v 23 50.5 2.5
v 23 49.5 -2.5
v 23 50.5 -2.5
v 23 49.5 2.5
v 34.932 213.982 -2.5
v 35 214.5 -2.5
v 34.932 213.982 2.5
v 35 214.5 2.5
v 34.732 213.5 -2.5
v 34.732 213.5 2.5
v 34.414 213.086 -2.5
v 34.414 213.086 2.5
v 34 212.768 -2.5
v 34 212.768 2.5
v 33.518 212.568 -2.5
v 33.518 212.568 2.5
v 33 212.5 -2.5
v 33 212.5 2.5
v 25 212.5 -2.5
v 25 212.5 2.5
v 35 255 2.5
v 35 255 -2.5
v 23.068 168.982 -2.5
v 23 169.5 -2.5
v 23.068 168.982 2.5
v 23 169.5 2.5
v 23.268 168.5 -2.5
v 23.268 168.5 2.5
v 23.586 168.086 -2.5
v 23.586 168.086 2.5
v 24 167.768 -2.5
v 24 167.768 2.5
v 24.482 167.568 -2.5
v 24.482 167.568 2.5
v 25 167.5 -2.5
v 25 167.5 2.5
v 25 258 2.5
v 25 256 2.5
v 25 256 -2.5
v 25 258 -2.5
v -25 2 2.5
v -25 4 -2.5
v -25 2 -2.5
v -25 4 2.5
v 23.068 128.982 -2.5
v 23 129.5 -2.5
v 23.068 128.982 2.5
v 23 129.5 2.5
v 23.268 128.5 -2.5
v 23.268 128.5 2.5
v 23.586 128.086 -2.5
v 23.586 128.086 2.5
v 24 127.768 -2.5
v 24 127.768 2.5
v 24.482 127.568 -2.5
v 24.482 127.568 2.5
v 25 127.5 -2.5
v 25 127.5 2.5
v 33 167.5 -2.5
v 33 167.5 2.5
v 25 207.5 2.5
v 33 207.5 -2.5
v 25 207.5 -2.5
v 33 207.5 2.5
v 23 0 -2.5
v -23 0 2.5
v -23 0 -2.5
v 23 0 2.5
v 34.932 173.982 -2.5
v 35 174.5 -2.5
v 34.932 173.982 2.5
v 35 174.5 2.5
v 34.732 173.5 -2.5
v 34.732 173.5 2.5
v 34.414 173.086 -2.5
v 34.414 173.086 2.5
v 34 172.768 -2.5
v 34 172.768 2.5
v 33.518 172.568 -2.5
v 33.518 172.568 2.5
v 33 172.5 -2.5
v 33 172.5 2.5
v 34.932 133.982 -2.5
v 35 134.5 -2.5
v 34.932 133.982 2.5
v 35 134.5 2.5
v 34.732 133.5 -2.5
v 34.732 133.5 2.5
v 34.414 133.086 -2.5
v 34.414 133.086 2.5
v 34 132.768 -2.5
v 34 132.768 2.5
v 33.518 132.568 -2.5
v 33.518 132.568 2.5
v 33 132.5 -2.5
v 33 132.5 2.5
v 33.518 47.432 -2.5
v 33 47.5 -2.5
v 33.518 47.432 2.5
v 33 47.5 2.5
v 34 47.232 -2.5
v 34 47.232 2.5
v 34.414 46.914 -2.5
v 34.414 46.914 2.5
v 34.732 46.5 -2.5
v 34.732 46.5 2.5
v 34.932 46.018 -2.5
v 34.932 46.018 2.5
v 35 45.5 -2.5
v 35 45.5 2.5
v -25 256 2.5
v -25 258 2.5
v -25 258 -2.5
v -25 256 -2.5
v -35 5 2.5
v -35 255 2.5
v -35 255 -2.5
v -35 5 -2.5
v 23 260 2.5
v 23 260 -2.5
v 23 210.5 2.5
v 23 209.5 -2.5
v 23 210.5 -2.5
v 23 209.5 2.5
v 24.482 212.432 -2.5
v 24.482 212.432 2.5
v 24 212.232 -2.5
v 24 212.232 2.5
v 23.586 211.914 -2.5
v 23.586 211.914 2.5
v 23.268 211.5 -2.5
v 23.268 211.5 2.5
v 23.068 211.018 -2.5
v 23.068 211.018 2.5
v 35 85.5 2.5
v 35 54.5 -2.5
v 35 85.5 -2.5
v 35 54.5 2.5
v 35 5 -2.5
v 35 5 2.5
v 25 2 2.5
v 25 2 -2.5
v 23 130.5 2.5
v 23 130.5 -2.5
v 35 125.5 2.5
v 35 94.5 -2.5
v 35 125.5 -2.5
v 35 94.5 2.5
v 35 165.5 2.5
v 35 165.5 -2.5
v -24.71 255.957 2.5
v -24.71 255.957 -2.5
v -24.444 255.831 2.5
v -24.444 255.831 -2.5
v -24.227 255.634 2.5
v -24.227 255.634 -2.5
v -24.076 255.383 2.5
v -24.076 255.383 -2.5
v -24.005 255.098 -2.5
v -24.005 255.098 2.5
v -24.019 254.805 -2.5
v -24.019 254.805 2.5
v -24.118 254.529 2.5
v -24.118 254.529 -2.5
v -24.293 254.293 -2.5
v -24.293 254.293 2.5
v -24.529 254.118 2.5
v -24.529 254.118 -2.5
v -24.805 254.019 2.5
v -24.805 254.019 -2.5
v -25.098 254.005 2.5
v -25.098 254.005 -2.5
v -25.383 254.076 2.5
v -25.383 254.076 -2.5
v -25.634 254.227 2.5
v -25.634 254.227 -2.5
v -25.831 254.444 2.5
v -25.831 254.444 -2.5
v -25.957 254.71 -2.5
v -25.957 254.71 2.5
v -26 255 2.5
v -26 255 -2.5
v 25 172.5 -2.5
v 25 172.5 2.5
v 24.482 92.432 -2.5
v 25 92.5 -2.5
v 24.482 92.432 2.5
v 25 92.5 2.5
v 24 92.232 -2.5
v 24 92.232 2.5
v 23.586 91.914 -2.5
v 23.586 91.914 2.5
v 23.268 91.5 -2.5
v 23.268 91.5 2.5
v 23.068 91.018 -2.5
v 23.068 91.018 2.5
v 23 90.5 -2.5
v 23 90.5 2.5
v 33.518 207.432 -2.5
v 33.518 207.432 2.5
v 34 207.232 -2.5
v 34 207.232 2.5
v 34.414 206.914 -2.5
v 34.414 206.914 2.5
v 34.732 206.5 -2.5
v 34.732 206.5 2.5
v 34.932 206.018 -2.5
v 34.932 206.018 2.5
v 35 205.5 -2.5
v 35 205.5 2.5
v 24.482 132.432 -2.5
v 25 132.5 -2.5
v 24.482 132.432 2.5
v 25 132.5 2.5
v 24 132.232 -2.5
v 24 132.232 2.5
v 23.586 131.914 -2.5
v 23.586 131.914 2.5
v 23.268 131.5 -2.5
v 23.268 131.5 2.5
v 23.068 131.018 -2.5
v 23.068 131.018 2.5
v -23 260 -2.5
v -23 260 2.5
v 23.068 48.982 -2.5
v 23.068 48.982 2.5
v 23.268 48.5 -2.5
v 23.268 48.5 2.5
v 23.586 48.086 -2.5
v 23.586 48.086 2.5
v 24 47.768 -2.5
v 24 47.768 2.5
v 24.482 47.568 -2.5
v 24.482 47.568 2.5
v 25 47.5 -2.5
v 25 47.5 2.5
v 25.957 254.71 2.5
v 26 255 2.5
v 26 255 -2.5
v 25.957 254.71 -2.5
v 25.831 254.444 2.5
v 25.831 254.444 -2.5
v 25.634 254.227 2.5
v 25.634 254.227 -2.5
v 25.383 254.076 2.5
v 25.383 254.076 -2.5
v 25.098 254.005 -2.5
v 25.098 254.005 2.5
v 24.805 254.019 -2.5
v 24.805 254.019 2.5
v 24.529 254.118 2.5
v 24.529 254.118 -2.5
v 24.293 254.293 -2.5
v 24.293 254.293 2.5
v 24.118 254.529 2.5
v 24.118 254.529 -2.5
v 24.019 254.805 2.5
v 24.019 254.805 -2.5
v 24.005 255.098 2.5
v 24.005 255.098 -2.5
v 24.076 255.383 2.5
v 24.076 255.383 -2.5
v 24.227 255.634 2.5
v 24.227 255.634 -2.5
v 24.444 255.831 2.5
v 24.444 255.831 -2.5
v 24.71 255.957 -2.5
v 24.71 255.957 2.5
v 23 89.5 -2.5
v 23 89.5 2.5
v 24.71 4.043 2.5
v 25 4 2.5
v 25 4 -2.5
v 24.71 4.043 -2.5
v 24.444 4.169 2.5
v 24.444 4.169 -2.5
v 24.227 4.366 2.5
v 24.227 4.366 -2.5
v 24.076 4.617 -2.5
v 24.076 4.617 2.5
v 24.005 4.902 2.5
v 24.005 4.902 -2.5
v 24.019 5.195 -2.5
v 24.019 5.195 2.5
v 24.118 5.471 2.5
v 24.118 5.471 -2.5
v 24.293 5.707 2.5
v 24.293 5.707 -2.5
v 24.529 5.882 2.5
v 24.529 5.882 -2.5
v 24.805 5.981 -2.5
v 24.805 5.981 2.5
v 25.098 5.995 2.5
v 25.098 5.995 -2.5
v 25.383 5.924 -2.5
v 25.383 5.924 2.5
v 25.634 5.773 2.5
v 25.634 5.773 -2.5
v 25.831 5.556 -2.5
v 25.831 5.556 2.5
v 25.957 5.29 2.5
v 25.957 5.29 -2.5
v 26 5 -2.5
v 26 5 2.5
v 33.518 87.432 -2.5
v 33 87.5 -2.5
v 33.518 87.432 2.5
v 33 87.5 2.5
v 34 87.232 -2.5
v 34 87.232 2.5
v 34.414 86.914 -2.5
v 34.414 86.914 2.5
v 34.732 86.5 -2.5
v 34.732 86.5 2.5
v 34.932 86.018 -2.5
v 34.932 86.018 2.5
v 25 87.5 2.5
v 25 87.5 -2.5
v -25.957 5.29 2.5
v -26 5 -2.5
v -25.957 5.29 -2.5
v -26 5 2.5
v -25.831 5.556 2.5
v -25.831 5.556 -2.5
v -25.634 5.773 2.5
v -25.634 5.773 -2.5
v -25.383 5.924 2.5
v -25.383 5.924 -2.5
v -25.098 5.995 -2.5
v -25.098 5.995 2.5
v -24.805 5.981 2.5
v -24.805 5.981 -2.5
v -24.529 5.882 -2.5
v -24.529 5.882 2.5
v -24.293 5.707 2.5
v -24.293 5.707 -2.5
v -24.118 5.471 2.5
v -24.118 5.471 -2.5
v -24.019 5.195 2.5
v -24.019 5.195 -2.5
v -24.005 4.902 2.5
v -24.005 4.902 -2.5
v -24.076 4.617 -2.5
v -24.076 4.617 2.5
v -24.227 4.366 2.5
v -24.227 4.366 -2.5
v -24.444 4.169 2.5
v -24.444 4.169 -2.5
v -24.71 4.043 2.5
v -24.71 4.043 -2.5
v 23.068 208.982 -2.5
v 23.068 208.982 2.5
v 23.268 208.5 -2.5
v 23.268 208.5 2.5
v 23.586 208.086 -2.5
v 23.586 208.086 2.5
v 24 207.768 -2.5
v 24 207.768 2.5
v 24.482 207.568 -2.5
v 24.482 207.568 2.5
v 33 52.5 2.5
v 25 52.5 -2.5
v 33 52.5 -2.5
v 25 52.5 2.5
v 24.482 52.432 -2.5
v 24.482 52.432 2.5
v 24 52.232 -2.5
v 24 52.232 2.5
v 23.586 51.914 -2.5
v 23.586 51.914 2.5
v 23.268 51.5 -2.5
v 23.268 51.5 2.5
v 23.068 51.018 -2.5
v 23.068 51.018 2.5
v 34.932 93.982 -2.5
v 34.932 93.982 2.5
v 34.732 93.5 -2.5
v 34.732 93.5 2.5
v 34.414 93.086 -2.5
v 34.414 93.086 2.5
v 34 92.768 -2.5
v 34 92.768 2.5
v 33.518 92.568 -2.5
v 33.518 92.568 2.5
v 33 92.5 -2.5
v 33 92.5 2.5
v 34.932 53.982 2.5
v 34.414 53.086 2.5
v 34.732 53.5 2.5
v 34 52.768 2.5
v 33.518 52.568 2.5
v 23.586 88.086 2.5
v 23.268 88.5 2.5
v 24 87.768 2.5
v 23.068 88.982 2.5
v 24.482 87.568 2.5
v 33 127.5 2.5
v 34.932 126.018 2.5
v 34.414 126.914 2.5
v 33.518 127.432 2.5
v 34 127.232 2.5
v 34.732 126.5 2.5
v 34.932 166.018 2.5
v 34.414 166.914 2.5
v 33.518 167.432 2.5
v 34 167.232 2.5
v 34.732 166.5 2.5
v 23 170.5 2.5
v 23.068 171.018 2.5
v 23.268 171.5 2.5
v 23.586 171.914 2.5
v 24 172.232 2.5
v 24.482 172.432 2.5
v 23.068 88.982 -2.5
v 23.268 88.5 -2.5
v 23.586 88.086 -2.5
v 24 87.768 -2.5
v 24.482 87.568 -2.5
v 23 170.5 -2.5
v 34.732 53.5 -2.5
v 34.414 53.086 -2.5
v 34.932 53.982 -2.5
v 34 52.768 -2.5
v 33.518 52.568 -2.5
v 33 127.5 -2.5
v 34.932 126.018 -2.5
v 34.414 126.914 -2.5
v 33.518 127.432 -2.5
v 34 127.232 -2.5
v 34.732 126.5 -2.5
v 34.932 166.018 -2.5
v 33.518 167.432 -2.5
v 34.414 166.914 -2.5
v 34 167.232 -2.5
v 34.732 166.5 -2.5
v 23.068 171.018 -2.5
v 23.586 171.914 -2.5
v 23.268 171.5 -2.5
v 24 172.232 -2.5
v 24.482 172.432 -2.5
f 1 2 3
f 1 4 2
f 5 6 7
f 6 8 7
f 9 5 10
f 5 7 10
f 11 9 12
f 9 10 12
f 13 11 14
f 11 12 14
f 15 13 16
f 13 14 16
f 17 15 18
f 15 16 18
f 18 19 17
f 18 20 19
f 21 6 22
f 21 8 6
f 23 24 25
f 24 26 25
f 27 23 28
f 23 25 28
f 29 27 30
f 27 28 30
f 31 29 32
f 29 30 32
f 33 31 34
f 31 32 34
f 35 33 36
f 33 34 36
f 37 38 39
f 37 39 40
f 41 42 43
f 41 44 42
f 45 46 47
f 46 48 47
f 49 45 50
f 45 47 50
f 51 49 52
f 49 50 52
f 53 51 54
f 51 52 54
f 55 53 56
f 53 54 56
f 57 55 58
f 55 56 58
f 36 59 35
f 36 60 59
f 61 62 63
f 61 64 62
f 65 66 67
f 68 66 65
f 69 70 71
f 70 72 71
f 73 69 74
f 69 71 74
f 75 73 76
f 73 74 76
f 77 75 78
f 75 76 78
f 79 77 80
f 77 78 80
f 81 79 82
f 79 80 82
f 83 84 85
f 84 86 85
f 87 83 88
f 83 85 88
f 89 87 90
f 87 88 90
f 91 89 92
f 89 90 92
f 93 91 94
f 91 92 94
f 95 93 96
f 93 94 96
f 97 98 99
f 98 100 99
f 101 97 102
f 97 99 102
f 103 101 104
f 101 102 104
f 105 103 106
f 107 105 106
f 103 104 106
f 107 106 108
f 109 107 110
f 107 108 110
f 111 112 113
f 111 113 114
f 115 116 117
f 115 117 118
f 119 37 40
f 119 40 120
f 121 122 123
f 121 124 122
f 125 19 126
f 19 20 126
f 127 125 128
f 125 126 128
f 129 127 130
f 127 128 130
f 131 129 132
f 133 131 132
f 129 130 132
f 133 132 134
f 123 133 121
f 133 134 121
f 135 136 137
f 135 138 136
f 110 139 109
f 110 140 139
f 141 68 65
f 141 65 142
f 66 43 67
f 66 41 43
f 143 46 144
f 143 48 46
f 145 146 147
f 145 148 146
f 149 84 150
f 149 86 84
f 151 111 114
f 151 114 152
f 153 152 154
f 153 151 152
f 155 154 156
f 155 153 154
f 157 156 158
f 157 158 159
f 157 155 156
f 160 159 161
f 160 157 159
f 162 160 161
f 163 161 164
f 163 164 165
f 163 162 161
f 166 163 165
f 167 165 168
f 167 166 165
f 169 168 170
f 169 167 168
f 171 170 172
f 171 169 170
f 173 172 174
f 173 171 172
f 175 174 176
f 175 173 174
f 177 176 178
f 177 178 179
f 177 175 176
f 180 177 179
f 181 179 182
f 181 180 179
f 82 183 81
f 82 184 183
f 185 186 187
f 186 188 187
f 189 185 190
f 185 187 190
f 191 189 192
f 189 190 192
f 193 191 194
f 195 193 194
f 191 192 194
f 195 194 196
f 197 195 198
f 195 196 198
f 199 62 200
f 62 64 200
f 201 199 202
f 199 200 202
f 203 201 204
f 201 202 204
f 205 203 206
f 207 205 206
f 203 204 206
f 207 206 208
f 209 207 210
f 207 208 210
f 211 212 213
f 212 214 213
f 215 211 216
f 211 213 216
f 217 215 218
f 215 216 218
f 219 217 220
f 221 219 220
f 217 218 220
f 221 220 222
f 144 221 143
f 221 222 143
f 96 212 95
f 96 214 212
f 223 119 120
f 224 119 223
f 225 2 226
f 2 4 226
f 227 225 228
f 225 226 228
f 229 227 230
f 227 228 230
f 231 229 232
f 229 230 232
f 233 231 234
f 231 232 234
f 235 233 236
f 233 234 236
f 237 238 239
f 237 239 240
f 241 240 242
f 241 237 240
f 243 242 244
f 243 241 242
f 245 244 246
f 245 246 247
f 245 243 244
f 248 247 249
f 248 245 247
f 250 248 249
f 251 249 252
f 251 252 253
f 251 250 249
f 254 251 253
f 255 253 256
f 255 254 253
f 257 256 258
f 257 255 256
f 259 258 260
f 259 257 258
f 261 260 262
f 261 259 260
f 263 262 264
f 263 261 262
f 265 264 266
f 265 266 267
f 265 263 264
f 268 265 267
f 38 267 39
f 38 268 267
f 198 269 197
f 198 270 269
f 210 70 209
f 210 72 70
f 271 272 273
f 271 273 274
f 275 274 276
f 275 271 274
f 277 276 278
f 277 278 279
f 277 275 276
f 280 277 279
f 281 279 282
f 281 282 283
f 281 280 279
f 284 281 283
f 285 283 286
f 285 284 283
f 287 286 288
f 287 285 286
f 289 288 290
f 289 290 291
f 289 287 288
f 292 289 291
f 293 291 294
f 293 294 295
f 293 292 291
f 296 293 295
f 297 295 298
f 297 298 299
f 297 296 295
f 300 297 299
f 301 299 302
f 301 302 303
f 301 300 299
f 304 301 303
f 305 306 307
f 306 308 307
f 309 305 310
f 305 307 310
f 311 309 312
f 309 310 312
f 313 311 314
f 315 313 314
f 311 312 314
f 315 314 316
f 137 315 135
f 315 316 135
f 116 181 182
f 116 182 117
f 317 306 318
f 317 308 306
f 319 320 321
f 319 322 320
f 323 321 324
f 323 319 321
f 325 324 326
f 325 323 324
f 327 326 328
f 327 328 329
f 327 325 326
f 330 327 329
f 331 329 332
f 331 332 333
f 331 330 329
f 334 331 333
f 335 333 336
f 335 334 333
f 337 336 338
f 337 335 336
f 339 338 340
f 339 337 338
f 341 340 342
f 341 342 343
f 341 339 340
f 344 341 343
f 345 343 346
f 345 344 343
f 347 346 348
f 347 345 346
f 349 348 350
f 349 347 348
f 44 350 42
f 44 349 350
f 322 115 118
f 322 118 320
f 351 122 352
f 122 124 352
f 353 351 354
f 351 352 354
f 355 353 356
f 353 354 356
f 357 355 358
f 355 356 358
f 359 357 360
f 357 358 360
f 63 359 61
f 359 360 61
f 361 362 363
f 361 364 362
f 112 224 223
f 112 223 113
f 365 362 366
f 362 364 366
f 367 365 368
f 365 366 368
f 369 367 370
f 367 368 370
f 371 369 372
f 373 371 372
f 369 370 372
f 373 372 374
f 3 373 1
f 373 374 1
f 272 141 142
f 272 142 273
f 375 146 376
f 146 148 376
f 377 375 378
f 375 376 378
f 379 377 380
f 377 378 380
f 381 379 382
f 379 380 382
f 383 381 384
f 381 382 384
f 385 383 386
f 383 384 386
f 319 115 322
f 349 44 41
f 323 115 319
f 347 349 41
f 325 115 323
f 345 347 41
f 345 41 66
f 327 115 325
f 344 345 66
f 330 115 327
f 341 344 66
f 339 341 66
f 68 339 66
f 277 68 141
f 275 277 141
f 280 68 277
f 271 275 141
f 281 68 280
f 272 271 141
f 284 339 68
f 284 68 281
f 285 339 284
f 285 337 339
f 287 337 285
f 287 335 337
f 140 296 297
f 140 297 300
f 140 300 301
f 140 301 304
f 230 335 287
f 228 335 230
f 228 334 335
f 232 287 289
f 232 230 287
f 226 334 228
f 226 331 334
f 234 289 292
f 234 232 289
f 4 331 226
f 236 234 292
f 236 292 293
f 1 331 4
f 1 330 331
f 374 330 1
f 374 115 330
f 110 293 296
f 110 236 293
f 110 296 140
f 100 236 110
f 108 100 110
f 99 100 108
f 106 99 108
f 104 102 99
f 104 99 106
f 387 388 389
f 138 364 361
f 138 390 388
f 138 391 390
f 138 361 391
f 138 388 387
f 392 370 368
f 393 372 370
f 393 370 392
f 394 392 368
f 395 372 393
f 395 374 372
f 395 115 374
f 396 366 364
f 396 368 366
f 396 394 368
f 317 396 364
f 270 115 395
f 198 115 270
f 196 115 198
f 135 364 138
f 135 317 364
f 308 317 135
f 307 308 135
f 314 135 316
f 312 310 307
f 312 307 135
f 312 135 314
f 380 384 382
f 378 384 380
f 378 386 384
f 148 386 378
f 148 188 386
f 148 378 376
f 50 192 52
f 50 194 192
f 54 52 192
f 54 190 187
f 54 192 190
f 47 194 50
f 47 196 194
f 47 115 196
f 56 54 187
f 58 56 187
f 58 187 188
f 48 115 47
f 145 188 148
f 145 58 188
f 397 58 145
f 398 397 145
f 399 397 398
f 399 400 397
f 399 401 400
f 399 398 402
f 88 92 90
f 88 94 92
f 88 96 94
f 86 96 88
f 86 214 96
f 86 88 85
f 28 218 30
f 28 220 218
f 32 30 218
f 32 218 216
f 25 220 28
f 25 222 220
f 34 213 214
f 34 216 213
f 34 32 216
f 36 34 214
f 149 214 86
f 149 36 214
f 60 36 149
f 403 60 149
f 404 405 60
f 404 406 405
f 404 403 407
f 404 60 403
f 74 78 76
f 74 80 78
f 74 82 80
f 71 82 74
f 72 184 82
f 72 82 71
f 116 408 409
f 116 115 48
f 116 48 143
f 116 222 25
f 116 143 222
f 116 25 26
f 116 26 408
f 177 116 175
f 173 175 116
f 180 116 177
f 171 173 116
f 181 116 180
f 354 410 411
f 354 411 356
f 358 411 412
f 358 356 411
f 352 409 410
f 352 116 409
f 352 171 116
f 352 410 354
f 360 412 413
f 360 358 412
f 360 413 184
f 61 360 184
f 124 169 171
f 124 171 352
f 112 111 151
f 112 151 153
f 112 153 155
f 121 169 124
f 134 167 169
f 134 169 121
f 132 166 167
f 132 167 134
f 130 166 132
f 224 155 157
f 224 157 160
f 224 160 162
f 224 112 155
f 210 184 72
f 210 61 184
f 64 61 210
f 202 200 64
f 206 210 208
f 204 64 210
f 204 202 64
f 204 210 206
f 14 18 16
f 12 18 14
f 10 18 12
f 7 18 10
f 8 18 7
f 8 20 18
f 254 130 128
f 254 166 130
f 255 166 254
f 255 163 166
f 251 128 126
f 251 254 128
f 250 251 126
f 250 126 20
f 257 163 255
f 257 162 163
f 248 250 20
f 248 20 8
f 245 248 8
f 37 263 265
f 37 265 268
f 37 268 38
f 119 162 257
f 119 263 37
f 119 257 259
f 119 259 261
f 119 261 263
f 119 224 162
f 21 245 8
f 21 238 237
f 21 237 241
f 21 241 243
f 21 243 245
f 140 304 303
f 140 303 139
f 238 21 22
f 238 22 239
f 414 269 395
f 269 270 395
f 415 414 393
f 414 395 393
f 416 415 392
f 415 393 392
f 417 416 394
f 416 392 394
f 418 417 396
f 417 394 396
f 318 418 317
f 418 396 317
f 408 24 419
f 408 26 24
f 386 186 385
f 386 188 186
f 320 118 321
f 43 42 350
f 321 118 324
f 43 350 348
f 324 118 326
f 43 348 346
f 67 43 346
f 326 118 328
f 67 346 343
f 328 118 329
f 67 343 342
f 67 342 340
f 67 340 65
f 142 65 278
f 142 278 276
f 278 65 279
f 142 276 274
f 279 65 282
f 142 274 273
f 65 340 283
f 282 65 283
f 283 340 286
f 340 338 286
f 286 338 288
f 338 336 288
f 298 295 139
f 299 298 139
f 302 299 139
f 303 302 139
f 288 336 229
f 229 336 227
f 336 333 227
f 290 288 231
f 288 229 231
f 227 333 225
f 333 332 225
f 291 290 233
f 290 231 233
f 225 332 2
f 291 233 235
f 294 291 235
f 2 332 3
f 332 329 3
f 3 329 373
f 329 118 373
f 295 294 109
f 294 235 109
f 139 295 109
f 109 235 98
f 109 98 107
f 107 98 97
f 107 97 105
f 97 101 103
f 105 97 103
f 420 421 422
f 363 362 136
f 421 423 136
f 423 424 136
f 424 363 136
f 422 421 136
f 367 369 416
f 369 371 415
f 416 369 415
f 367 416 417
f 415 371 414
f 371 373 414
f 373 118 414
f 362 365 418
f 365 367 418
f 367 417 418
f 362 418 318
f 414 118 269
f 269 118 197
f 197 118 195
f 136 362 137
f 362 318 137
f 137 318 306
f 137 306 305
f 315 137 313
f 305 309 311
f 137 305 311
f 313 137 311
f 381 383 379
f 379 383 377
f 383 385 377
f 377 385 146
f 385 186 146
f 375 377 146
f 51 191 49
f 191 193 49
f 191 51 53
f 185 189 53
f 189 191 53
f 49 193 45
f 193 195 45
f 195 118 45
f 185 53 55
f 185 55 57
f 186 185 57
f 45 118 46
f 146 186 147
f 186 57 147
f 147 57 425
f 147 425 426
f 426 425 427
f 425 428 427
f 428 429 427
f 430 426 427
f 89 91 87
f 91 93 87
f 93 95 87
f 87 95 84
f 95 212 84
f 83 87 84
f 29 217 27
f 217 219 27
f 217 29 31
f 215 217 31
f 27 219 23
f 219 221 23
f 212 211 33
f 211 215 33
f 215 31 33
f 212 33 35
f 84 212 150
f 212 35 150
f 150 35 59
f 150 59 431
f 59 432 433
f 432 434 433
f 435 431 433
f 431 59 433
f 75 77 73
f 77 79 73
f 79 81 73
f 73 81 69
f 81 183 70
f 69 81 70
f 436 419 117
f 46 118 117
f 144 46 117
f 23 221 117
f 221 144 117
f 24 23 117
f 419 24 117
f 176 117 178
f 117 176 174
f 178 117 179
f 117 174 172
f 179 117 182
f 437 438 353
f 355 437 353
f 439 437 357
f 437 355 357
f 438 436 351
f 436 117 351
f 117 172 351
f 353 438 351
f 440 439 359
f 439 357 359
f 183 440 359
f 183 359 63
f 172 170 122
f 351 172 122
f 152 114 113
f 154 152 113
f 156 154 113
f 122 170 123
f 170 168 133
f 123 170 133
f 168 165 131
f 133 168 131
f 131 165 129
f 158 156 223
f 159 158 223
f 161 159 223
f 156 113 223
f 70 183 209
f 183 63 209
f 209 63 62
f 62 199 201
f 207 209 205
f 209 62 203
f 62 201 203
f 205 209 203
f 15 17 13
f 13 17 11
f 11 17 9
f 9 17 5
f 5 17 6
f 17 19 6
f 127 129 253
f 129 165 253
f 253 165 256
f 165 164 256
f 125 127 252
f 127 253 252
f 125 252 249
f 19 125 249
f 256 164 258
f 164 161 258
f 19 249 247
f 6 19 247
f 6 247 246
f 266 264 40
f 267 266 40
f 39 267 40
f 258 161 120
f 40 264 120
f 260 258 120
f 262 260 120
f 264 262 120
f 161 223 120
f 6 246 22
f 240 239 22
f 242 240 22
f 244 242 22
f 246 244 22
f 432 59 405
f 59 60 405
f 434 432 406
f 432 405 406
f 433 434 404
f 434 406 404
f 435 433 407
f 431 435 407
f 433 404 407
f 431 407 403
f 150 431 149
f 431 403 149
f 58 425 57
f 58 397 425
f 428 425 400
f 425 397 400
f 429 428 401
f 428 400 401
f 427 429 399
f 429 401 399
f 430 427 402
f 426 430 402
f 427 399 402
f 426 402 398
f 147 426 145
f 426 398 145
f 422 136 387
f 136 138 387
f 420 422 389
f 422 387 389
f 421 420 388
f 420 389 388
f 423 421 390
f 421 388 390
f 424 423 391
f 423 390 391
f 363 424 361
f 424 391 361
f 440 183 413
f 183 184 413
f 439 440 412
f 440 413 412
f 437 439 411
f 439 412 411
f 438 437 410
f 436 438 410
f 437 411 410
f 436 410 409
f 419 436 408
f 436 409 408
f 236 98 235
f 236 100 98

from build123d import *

# Parameters (mm, degrees)
EXTRUDE_1_DEPTH = 2.5
FILLET_1_R      = 2


with BuildPart() as part:
    # 草圖1 → 填料-伸長1 (new, symmetric)
    with BuildSketch(Plane.XY):
        with BuildLine():
            Line((-25, 2), (-23, 0))
            Line((-23, 0), (23, 0))
            Line((23, 0), (25, 2))
            Line((25, 2), (25, 4))
            ThreePointArc((25, 4), (24.292893219, 5.707106781), (26, 5))
            Line((26, 5), (35, 5))
            Line((35, 5), (35, 47.5))
            Line((35, 47.5), (23, 47.5))
            Line((23, 47.5), (23, 52.5))
            Line((23, 52.5), (35, 52.5))
            Line((35, 52.5), (35, 87.5))
            Line((35, 87.5), (23, 87.5))
            Line((23, 87.5), (23, 92.5))
            Line((23, 92.5), (35, 92.5))
            Line((35, 92.5), (35, 127.5))
            Line((35, 127.5), (23, 127.5))
            Line((23, 127.5), (23, 132.5))
            Line((23, 132.5), (35, 132.5))
            Line((35, 132.5), (35, 167.5))
            Line((35, 167.5), (23, 167.5))
            Line((23, 167.5), (23, 172.5))
            Line((23, 172.5), (35, 172.5))
            Line((35, 172.5), (35, 207.5))
            Line((35, 207.5), (23, 207.5))
            Line((23, 207.5), (23, 212.5))
            Line((23, 212.5), (35, 212.5))
            Line((35, 212.5), (35, 255))
            Line((35, 255), (26, 255))
            ThreePointArc((26, 255), (24.292893219, 254.292893219), (25, 256))
            Line((25, 256), (25, 258))
            Line((25, 258), (23, 260))
            Line((23, 260), (-23, 260))
            Line((-23, 260), (-25, 258))
            Line((-25, 258), (-25, 256))
            ThreePointArc((-25, 256), (-24.292893219, 254.292893219), (-26, 255))
            Line((-26, 255), (-35, 255))
            Line((-35, 255), (-35, 5))
            Line((-35, 5), (-26, 5))
            ThreePointArc((-26, 5), (-24.292893219, 5.707106781), (-25, 4))
            Line((-25, 4), (-25, 2))
        make_face()
    extrude(amount=EXTRUDE_1_DEPTH, both=True)

    # 圓角1
    fillet_1_edges = [part.edges().sort_by_distance(p)[0] for p in [
        (35, 47.5, 0),
        (23, 47.5, 0),
        (23, 52.5, 0),
        (35, 52.5, 0),
        (35, 87.5, 0),
        (23, 87.5, 0),
        (23, 92.5, 0),
        (35, 92.5, 0),
        (35, 127.5, 0),
        (23, 127.5, 0),
        (23, 132.5, 0),
        (35, 132.5, 0),
        (35, 167.5, 0),
        (23, 167.5, 0),
        (23, 172.5, 0),
        (35, 172.5, 0),
        (35, 207.5, 0),
        (23, 207.5, 0),
        (23, 212.5, 0),
        (35, 212.5, 0),
    ]]
    fillet(fillet_1_edges, radius=FILLET_1_R)


solid = part.part
